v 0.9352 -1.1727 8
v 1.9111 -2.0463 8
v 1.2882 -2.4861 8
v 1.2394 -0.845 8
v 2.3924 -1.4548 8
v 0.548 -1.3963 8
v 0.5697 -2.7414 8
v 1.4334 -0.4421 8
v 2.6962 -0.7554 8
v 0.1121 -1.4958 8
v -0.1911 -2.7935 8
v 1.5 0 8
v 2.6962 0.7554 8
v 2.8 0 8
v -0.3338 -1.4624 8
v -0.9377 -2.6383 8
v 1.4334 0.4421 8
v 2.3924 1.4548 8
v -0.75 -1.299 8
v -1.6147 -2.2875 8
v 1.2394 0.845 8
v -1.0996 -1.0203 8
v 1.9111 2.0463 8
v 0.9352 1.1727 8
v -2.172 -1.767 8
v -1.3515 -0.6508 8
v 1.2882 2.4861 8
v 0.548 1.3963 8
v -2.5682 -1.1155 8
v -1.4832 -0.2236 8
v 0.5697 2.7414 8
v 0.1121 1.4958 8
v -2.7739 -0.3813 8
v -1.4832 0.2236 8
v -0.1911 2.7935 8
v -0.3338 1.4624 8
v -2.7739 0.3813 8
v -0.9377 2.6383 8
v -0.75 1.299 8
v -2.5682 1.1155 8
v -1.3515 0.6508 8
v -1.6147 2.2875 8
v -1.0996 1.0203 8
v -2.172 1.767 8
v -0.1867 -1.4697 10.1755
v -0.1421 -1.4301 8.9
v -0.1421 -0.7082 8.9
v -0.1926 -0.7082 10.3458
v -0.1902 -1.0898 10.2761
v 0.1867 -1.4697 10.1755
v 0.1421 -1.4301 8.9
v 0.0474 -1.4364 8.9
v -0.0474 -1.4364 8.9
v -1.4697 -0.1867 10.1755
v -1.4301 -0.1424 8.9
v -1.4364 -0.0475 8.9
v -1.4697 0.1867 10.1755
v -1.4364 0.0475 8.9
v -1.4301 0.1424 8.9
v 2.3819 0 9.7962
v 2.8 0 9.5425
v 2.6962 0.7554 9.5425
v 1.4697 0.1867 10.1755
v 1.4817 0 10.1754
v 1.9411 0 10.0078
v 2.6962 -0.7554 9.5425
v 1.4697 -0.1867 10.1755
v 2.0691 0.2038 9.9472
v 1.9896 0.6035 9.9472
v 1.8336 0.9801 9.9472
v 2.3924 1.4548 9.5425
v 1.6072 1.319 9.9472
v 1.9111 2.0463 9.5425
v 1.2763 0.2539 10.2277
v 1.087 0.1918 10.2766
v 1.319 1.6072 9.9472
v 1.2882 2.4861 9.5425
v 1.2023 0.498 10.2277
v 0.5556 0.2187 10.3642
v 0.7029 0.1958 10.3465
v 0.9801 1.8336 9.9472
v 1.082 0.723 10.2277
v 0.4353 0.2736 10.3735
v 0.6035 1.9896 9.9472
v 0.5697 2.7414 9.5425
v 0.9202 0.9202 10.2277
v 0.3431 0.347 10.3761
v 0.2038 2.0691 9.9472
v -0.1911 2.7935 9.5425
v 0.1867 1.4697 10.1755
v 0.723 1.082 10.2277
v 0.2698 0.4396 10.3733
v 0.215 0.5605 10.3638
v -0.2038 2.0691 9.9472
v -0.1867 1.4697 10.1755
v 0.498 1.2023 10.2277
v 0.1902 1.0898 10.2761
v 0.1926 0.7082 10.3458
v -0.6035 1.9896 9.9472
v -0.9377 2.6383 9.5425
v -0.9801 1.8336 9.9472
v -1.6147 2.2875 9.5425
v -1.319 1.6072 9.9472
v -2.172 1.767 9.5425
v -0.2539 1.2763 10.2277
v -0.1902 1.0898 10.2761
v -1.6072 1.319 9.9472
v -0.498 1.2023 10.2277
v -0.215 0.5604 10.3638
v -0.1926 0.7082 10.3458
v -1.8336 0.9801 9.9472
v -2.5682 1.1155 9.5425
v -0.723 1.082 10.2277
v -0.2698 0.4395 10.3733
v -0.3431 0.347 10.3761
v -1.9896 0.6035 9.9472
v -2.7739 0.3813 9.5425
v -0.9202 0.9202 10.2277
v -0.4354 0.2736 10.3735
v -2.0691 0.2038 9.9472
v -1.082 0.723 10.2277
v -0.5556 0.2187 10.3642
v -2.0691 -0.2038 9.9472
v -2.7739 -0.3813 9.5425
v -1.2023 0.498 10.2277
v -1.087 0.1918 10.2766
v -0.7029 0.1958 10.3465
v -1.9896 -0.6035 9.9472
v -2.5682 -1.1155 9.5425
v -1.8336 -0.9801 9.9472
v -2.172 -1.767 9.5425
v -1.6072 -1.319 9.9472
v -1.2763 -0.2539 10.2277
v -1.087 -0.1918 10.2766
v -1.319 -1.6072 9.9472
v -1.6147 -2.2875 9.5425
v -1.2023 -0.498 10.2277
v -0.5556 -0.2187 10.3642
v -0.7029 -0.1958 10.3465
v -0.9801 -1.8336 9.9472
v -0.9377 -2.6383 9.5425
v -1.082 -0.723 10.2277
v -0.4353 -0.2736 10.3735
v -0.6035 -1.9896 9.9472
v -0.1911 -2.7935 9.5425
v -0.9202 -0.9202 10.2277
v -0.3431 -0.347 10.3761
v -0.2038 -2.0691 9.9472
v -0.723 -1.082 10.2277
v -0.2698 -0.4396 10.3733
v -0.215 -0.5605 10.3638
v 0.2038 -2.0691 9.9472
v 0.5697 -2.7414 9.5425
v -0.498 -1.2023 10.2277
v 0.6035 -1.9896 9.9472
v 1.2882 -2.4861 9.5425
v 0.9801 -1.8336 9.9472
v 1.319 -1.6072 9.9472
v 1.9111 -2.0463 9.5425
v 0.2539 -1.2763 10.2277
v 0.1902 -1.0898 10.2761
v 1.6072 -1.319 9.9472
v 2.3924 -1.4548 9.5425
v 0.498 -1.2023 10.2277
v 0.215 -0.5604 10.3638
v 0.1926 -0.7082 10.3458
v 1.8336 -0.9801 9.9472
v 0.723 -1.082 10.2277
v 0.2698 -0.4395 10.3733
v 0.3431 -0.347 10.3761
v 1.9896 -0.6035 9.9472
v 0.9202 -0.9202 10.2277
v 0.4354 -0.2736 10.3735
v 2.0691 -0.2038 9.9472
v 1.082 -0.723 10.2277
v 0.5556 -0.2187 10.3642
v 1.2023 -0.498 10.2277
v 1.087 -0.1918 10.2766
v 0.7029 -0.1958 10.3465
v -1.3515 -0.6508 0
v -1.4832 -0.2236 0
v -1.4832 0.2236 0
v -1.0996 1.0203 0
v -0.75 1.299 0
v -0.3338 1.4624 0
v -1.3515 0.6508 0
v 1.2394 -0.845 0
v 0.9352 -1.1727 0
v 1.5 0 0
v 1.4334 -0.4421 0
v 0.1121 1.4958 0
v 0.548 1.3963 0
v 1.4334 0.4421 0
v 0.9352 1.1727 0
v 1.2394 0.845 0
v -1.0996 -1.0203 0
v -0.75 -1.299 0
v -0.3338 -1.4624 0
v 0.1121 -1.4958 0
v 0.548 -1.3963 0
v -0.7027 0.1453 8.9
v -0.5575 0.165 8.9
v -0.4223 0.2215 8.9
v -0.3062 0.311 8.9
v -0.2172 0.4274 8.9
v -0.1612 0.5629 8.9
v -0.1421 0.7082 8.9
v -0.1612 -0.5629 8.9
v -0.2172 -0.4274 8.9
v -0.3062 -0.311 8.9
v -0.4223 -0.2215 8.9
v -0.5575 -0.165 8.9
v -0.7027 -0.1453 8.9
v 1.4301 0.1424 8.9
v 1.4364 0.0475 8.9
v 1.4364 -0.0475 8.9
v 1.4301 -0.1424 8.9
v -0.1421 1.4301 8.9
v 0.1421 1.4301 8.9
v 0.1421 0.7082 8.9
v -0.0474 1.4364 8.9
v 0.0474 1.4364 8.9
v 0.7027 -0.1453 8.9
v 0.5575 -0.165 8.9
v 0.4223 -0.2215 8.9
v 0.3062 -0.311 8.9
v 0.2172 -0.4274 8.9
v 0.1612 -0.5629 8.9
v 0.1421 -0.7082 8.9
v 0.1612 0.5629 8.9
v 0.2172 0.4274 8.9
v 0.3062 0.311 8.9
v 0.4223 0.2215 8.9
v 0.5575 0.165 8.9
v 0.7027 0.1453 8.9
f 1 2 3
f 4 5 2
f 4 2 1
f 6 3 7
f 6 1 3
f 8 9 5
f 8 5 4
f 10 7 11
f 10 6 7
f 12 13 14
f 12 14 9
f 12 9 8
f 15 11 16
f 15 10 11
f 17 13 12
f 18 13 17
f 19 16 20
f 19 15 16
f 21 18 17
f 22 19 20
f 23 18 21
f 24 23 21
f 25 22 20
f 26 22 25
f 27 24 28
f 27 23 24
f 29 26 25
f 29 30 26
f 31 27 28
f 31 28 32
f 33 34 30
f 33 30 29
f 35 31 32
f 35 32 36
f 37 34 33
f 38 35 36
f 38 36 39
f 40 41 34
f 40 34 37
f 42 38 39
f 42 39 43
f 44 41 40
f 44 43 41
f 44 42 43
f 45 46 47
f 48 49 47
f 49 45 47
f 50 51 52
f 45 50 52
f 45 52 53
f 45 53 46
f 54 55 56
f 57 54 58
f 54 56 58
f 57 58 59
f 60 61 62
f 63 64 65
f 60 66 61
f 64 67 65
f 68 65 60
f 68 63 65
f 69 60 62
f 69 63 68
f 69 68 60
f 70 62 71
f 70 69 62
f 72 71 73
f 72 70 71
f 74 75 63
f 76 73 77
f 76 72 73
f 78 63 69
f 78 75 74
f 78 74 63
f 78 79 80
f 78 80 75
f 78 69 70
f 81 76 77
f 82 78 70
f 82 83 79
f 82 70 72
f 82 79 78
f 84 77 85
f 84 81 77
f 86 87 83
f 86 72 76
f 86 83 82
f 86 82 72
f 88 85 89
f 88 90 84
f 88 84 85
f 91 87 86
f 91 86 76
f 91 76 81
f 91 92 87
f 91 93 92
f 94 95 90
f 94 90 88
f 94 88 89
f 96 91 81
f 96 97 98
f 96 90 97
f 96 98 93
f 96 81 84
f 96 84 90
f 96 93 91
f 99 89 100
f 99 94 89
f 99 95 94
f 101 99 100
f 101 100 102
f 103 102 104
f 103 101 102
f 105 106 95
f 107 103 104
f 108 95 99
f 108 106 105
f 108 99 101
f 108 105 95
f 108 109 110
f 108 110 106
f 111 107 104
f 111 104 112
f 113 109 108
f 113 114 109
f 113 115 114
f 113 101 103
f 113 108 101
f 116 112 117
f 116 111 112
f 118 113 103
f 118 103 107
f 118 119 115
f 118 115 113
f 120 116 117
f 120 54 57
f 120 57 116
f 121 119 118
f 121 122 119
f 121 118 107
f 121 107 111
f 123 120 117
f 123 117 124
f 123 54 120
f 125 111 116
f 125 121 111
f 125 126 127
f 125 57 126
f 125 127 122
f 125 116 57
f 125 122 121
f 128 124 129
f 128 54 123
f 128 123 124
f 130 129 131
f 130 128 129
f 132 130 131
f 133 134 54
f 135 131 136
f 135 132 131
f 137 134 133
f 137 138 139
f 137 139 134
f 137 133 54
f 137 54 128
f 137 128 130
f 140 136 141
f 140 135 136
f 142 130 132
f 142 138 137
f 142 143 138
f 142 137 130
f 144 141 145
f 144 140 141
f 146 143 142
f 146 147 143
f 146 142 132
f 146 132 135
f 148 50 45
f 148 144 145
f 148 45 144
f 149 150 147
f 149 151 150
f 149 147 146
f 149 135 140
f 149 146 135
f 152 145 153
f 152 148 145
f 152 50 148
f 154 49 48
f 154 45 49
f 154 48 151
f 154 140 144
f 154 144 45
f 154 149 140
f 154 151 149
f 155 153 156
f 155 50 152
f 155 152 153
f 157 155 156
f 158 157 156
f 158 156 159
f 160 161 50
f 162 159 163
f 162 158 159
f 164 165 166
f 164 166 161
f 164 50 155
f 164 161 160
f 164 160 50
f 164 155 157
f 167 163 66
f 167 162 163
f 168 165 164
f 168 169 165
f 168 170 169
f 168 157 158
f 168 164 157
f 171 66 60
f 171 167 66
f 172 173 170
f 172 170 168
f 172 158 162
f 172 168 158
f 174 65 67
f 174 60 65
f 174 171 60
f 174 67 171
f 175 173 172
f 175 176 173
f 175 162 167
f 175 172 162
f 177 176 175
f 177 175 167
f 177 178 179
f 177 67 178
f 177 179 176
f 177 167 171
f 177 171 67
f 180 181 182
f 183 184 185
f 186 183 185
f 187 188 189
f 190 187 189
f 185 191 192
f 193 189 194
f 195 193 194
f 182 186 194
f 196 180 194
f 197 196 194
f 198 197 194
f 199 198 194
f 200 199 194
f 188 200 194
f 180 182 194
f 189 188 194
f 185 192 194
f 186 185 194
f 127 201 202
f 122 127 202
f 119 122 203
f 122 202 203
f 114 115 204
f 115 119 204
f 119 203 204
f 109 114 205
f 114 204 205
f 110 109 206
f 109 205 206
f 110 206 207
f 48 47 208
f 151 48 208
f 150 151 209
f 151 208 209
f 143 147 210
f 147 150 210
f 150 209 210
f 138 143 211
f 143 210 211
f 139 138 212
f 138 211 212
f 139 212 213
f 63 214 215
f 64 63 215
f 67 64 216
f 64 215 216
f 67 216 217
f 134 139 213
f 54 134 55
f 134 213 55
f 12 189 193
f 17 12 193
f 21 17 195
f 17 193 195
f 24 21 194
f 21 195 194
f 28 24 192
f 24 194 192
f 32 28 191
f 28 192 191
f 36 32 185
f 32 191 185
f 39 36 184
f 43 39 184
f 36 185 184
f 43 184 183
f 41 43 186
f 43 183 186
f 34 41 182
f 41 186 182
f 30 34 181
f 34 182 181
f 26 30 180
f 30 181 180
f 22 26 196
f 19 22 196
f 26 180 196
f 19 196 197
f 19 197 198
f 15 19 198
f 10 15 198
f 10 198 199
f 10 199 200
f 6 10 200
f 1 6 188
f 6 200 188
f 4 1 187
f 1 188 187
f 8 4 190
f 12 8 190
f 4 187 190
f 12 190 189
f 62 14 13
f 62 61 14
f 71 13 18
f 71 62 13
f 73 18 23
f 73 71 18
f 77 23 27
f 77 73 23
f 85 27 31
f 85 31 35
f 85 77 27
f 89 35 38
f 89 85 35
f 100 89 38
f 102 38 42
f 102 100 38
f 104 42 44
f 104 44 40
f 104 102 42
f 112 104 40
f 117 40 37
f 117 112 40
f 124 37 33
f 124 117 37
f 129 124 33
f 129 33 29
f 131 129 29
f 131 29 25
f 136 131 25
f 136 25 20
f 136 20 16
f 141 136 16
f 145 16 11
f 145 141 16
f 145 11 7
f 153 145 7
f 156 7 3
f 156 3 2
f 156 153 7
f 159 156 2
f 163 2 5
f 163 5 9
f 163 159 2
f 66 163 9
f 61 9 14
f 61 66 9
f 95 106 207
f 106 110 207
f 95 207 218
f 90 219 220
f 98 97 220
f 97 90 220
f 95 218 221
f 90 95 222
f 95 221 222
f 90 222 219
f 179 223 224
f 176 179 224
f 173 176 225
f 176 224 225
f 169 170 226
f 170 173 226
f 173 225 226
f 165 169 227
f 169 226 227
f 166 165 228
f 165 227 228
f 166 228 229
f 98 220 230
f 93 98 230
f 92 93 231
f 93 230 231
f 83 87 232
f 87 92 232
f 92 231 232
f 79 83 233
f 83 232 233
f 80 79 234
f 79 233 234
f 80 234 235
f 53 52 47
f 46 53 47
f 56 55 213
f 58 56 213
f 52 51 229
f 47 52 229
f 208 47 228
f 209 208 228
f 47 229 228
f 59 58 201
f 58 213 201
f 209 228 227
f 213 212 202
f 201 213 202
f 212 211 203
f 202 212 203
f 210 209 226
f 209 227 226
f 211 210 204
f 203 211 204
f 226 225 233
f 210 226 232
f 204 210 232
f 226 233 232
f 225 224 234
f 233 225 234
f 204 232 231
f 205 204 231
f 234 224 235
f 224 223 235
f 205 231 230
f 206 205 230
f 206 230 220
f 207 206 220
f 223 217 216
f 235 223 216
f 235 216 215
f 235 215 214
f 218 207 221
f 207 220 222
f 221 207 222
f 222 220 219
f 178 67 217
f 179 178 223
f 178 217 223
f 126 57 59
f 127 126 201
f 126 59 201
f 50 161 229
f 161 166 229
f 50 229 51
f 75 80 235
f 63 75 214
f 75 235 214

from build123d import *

# Parameters (mm, degrees)
SKETCH1_R          = 1.5
BASE_EXTRUDE_DEPTH = 8
CUT_EXTRUDE1_DEPTH = 1.799999969
CUT_EXTRUDE1_TAPER = 2


with BuildPart() as part:
    # Sketch1 → Base-Extrude (new body)
    with BuildSketch(Plane.XY):
        Circle(SKETCH1_R)
    extrude(amount=BASE_EXTRUDE_DEPTH)

    # Sketch6 → Boss-Revolve2 (revolve)
    with BuildSketch(Plane(origin=(0, 0, 0), x_dir=(1, 0, 0), z_dir=(0, 1, 0))):
        with BuildLine():
            Line((0, -8), (2.7999999, -8))
            Line((2.7999999, -8), (2.7999999, -9.54246308))
            ThreePointArc((2.7999999, -9.54246308), (1.46418655, -10.180811406), (0, -10.4))
            Line((0, -10.4), (0, -8))
        make_face()
    revolve(axis=Axis((0, 0, -0.393620135), (0, 0, 1)))

    # Sketch7 → Cut-Extrude1 (cut)
    with BuildSketch(Plane(origin=(0, 0, 10.7000001), x_dir=(-1, 0, 0), z_dir=(0, 0, -1))):
        with BuildLine():
            ThreePointArc((0.205000004, 1.48592565), (0, 1.500000013), (-0.205000004, 1.48592565))
            Line((-0.205000004, 1.48592565), (-0.205000004, 0.708178558))
            ThreePointArc((-0.205000004, 0.708178558), (-0.35072876, 0.355344481), (-0.702967546, 0.208182689))
            Line((-0.702967546, 0.208182689), (-1.48592565, 0.205000004))
            ThreePointArc((-1.48592565, 0.205000004), (-1.500000013, 0), (-1.48592565, -0.205000004))
            Line((-1.48592565, -0.205000004), (-0.702967546, -0.208182689))
            ThreePointArc((-0.702967546, -0.208182689), (-0.35072876, -0.355344481), (-0.205000004, -0.708178558))
            Line((-0.205000004, -0.708178558), (-0.205000004, -1.48592565))
            ThreePointArc((-0.205000004, -1.48592565), (0, -1.500000013), (0.205000004, -1.48592565))
            Line((0.205000004, -1.48592565), (0.205000004, -0.708178558))
            ThreePointArc((0.205000004, -0.708178558), (0.35072876, -0.355344481), (0.702967546, -0.208182689))
            Line((0.702967546, -0.208182689), (1.48592565, -0.205000004))
            ThreePointArc((1.48592565, -0.205000004), (1.500000013, 0), (1.48592565, 0.205000004))
            Line((1.48592565, 0.205000004), (0.702967546, 0.208182689))
            ThreePointArc((0.702967546, 0.208182689), (0.35072876, 0.355344481), (0.205000004, 0.708178558))
            Line((0.205000004, 0.708178558), (0.205000004, 1.48592565))
        make_face()
    extrude(amount=CUT_EXTRUDE1_DEPTH, taper=CUT_EXTRUDE1_TAPER, mode=Mode.SUBTRACT)


solid = part.part
